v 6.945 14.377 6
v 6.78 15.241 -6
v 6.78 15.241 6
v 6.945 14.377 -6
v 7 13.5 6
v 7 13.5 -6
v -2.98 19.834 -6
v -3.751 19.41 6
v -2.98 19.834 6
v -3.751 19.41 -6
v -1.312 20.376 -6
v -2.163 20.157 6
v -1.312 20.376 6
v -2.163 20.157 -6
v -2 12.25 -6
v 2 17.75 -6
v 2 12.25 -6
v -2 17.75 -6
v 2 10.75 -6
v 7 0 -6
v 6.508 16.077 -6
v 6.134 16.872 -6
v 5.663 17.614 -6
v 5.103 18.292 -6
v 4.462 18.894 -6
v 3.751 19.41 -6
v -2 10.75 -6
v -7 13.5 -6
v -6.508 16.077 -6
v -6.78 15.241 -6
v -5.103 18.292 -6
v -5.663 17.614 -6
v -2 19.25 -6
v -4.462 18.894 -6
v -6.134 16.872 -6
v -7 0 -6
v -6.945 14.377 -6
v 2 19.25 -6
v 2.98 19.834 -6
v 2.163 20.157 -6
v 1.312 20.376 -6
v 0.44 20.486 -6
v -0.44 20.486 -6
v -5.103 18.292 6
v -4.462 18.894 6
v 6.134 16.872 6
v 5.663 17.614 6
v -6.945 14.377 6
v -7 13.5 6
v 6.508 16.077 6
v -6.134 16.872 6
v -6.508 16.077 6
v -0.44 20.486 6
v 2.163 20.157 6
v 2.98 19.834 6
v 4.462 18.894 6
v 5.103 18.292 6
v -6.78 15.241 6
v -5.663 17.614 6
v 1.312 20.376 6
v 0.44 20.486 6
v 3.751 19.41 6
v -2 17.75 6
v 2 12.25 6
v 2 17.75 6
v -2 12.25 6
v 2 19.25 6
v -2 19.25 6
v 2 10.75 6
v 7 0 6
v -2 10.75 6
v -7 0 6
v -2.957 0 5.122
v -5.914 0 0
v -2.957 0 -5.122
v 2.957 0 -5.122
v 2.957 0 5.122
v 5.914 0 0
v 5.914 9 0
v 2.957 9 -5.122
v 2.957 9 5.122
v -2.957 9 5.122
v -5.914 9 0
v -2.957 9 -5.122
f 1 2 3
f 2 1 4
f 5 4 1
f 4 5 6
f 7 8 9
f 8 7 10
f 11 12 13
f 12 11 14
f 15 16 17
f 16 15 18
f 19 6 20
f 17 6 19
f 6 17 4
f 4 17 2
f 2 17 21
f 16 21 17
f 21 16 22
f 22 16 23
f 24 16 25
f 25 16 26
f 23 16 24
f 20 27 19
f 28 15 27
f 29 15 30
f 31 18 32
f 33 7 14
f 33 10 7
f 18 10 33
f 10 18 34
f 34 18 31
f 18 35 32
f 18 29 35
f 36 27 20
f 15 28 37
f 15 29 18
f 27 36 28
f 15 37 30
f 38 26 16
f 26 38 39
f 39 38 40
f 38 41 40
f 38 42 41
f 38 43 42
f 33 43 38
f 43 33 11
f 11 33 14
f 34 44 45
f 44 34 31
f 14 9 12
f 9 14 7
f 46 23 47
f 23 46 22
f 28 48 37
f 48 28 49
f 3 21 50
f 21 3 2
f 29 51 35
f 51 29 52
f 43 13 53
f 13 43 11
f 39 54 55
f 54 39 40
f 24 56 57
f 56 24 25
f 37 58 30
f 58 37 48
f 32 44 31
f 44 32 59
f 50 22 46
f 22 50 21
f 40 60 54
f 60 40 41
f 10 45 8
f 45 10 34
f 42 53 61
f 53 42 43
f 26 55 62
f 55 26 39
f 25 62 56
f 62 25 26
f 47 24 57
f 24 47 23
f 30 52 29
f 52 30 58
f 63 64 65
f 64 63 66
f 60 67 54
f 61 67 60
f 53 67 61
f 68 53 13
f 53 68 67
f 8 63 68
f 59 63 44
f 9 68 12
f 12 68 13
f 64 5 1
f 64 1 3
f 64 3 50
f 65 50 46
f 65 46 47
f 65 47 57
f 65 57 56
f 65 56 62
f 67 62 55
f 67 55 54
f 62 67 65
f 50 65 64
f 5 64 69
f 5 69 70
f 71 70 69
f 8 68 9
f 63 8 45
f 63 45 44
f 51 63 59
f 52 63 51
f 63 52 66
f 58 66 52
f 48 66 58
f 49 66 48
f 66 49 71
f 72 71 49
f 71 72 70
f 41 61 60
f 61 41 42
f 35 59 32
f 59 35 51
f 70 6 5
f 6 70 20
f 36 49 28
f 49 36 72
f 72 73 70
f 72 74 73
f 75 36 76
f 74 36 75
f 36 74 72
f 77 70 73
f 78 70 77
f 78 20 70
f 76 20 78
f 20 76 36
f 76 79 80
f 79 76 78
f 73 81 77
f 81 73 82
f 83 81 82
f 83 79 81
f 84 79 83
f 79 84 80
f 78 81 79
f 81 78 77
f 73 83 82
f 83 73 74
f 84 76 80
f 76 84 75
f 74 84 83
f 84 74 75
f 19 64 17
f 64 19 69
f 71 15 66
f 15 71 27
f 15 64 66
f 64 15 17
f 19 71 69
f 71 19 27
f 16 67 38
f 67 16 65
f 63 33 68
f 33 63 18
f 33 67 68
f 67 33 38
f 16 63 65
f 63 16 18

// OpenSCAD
$fn = 50;


difference() {
	union() {
		translate(v = [0, 13.5000000000, -6.0000000000]) {
			cylinder(h = 12, r = 7.0000000000);
		}
		translate(v = [0, 13.5000000000, -6.0000000000]) {
			cylinder(h = 12, r = 7.0000000000);
		}
		translate(v = [-7.0000000000, 0, -6.0000000000]) {
			cube(size = [14, 13.5000000000, 12]);
		}
	}
	union() {
		translate(v = [0.0000000000, 9, 0]) {
			rotate(a = [0, 0, 0]) {
				difference() {
					union() {
						rotate(a = [90, 0, 0]) {
							linear_extrude(height = 13.5000000000) {
								polygon(points = [[5.9142500000, 0.0000000000], [2.9571250000, 5.1218907443], [-2.9571250000, 5.1218907443], [-5.9142500000, 0.0000000000], [-2.9571250000, -5.1218907443], [2.9571250000, -5.1218907443]]);
							}
						}
					}
					union();
				}
			}
		}
		translate(v = [-2.0000000000, 10.7500000000, -50]) {
			cube(size = [4, 1.5000000000, 100]);
		}
		translate(v = [-2.0000000000, 17.7500000000, -50]) {
			cube(size = [4, 1.5000000000, 100]);
		}
		translate(v = [0.0000000000, 8, 0]) {
			rotate(a = [90, 0, 0]) {
				cylinder(h = 8, r = 3.2500000000);
			}
		}
	}
}
